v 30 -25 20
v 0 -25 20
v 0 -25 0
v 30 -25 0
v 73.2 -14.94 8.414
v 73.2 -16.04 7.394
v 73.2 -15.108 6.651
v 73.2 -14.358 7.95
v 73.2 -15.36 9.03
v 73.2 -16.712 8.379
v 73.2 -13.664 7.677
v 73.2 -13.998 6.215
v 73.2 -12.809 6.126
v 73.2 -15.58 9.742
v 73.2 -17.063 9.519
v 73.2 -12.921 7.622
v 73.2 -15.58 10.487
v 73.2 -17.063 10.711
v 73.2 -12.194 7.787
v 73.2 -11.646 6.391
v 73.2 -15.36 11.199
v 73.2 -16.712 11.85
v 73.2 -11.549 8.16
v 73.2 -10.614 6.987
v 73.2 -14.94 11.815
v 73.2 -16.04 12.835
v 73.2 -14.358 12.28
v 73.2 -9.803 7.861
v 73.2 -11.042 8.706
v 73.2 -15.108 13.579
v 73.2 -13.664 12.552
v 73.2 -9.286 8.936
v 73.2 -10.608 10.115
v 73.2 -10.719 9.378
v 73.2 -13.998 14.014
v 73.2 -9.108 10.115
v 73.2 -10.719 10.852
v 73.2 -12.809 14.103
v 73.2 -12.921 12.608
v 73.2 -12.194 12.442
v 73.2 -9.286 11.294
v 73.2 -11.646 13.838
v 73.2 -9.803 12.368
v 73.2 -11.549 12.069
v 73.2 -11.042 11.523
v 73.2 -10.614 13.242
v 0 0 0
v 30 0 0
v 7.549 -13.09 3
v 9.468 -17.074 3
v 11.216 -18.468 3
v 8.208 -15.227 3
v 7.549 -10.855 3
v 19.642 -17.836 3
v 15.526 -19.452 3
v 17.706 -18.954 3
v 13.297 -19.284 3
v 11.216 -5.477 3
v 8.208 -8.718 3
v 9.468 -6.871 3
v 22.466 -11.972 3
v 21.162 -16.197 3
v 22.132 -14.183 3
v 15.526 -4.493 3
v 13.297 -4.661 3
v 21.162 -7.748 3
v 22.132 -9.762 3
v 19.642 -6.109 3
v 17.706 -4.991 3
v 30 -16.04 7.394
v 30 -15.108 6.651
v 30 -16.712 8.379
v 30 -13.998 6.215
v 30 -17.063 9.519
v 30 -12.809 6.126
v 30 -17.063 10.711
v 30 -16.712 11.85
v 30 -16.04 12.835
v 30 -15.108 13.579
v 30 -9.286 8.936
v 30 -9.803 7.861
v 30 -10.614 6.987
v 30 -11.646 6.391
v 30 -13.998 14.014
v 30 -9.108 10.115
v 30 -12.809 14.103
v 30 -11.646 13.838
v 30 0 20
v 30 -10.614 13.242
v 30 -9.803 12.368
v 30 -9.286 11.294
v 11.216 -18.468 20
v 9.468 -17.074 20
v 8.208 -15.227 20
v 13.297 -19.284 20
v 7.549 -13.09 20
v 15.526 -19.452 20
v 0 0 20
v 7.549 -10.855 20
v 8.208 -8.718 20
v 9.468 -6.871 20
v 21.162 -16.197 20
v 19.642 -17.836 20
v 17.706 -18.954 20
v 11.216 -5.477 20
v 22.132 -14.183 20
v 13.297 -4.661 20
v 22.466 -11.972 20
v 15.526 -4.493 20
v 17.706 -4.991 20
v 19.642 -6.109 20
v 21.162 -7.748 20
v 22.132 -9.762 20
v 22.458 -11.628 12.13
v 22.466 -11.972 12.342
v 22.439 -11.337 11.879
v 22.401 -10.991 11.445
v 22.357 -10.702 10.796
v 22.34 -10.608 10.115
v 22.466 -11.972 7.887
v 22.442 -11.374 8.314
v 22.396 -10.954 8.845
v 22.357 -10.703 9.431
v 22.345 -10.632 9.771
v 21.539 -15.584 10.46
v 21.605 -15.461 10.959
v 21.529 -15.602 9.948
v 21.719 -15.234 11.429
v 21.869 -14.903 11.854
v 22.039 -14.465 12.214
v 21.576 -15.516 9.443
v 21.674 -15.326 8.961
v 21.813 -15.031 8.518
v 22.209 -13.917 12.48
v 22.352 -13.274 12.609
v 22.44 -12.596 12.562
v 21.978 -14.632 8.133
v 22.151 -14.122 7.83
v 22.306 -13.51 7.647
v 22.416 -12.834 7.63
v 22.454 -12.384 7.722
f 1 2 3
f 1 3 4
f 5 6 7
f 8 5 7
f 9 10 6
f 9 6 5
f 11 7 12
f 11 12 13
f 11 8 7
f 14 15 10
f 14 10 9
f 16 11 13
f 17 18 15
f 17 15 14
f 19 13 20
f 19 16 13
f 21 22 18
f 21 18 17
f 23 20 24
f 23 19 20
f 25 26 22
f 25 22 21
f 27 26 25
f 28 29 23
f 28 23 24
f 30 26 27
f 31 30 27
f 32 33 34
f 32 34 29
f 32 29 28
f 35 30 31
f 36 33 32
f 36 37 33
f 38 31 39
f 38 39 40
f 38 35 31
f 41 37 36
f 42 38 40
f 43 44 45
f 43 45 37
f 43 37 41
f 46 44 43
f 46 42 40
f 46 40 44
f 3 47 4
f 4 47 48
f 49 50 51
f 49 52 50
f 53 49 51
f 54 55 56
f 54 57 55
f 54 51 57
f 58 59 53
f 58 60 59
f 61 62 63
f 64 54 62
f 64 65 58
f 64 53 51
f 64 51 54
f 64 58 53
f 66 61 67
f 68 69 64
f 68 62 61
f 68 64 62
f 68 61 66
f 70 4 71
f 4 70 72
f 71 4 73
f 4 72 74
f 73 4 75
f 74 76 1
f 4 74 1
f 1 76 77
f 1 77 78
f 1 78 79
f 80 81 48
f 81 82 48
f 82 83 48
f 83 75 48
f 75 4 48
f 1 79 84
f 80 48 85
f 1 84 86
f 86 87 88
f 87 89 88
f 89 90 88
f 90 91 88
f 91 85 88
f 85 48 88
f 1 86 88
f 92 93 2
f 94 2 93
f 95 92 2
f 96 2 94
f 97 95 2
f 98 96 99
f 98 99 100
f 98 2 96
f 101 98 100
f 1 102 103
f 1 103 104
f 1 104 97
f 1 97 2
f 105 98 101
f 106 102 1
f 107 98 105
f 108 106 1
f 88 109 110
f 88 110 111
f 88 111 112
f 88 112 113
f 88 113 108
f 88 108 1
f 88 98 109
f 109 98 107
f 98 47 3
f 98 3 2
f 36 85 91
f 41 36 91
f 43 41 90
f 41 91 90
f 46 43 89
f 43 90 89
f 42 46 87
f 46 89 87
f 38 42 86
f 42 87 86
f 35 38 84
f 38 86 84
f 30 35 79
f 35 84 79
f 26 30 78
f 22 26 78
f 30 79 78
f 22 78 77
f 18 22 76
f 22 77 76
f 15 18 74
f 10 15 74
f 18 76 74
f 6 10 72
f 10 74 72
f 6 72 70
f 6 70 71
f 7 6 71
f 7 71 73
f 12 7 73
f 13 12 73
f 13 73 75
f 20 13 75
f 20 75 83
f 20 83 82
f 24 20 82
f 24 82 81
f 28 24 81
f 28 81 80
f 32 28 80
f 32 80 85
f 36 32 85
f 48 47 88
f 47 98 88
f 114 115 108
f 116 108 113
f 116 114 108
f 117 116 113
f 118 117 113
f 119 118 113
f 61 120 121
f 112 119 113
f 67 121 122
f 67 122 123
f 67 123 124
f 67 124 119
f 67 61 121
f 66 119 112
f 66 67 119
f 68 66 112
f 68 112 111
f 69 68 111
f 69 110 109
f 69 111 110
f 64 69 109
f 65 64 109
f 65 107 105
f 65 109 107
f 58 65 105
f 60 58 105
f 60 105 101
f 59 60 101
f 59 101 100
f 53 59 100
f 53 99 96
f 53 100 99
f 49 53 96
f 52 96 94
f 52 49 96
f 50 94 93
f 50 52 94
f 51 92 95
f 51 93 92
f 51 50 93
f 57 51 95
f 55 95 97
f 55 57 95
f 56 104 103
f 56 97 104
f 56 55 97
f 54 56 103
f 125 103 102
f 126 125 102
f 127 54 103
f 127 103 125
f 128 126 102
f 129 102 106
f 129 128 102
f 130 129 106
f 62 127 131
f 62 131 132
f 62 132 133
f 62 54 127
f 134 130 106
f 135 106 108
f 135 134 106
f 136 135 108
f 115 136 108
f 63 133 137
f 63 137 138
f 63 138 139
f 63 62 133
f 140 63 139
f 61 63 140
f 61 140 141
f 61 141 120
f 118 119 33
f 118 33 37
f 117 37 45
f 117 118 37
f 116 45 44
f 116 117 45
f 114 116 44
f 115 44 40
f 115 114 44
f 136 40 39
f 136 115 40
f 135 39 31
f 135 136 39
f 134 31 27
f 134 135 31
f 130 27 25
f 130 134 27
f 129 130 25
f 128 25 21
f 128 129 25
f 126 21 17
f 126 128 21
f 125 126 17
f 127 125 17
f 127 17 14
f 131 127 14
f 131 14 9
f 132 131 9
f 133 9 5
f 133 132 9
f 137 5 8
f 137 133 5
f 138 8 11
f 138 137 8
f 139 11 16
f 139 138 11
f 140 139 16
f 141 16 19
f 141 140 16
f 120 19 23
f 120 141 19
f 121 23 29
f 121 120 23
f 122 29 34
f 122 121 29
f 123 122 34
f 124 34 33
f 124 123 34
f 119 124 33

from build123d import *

# Parameters (mm, degrees)
F0_W     = 30
F0_H     = 20
F1_DEPTH = 25
F2_R     = 7.5
F3_DEPTH = 26
F4_W     = 30
F4_H     = 25
F5_DEPTH = 3
F8_START = 25.6
F7_R     = 4
F8_DEPTH = 47.6
F9_START = 17.7
F6_R     = 2.5
F9_DEPTH = 70.5


with BuildPart() as f1:
    # F0 (on Front) → F1 (new body)
    with BuildSketch(Plane.XZ):
        with Locations((15, 10)):
            Rectangle(F0_W, F0_H)
    extrude(amount=F1_DEPTH)

    # F2 (on Top) → F3 (cut)
    with BuildSketch(Plane.XY):
        with Locations((14.9655956775, -11.9724776596)):
            Circle(F2_R)
    extrude(amount=F3_DEPTH, mode=Mode.SUBTRACT)

    # F4 (on Top) → F5 (join)
    with BuildSketch(Plane.XY):
        with Locations((15, -12.5)):
            Rectangle(F4_W, F4_H)
    extrude(amount=F5_DEPTH)

    # F7 (on Right) → F8 (join)
    with BuildSketch(Plane.YZ.offset(F8_START)):
        with Locations((-13.1077989936, 10.114679113)):
            Circle(F7_R)
    extrude(amount=F8_DEPTH)

    # F6 (on Right) → F9 (cut)
    with BuildSketch(Plane.YZ.offset(F9_START)):
        with Locations((-13.1077989936, 10.114679113)):
            Circle(F6_R)
    extrude(amount=F9_DEPTH, mode=Mode.SUBTRACT)


solid = f1.part
